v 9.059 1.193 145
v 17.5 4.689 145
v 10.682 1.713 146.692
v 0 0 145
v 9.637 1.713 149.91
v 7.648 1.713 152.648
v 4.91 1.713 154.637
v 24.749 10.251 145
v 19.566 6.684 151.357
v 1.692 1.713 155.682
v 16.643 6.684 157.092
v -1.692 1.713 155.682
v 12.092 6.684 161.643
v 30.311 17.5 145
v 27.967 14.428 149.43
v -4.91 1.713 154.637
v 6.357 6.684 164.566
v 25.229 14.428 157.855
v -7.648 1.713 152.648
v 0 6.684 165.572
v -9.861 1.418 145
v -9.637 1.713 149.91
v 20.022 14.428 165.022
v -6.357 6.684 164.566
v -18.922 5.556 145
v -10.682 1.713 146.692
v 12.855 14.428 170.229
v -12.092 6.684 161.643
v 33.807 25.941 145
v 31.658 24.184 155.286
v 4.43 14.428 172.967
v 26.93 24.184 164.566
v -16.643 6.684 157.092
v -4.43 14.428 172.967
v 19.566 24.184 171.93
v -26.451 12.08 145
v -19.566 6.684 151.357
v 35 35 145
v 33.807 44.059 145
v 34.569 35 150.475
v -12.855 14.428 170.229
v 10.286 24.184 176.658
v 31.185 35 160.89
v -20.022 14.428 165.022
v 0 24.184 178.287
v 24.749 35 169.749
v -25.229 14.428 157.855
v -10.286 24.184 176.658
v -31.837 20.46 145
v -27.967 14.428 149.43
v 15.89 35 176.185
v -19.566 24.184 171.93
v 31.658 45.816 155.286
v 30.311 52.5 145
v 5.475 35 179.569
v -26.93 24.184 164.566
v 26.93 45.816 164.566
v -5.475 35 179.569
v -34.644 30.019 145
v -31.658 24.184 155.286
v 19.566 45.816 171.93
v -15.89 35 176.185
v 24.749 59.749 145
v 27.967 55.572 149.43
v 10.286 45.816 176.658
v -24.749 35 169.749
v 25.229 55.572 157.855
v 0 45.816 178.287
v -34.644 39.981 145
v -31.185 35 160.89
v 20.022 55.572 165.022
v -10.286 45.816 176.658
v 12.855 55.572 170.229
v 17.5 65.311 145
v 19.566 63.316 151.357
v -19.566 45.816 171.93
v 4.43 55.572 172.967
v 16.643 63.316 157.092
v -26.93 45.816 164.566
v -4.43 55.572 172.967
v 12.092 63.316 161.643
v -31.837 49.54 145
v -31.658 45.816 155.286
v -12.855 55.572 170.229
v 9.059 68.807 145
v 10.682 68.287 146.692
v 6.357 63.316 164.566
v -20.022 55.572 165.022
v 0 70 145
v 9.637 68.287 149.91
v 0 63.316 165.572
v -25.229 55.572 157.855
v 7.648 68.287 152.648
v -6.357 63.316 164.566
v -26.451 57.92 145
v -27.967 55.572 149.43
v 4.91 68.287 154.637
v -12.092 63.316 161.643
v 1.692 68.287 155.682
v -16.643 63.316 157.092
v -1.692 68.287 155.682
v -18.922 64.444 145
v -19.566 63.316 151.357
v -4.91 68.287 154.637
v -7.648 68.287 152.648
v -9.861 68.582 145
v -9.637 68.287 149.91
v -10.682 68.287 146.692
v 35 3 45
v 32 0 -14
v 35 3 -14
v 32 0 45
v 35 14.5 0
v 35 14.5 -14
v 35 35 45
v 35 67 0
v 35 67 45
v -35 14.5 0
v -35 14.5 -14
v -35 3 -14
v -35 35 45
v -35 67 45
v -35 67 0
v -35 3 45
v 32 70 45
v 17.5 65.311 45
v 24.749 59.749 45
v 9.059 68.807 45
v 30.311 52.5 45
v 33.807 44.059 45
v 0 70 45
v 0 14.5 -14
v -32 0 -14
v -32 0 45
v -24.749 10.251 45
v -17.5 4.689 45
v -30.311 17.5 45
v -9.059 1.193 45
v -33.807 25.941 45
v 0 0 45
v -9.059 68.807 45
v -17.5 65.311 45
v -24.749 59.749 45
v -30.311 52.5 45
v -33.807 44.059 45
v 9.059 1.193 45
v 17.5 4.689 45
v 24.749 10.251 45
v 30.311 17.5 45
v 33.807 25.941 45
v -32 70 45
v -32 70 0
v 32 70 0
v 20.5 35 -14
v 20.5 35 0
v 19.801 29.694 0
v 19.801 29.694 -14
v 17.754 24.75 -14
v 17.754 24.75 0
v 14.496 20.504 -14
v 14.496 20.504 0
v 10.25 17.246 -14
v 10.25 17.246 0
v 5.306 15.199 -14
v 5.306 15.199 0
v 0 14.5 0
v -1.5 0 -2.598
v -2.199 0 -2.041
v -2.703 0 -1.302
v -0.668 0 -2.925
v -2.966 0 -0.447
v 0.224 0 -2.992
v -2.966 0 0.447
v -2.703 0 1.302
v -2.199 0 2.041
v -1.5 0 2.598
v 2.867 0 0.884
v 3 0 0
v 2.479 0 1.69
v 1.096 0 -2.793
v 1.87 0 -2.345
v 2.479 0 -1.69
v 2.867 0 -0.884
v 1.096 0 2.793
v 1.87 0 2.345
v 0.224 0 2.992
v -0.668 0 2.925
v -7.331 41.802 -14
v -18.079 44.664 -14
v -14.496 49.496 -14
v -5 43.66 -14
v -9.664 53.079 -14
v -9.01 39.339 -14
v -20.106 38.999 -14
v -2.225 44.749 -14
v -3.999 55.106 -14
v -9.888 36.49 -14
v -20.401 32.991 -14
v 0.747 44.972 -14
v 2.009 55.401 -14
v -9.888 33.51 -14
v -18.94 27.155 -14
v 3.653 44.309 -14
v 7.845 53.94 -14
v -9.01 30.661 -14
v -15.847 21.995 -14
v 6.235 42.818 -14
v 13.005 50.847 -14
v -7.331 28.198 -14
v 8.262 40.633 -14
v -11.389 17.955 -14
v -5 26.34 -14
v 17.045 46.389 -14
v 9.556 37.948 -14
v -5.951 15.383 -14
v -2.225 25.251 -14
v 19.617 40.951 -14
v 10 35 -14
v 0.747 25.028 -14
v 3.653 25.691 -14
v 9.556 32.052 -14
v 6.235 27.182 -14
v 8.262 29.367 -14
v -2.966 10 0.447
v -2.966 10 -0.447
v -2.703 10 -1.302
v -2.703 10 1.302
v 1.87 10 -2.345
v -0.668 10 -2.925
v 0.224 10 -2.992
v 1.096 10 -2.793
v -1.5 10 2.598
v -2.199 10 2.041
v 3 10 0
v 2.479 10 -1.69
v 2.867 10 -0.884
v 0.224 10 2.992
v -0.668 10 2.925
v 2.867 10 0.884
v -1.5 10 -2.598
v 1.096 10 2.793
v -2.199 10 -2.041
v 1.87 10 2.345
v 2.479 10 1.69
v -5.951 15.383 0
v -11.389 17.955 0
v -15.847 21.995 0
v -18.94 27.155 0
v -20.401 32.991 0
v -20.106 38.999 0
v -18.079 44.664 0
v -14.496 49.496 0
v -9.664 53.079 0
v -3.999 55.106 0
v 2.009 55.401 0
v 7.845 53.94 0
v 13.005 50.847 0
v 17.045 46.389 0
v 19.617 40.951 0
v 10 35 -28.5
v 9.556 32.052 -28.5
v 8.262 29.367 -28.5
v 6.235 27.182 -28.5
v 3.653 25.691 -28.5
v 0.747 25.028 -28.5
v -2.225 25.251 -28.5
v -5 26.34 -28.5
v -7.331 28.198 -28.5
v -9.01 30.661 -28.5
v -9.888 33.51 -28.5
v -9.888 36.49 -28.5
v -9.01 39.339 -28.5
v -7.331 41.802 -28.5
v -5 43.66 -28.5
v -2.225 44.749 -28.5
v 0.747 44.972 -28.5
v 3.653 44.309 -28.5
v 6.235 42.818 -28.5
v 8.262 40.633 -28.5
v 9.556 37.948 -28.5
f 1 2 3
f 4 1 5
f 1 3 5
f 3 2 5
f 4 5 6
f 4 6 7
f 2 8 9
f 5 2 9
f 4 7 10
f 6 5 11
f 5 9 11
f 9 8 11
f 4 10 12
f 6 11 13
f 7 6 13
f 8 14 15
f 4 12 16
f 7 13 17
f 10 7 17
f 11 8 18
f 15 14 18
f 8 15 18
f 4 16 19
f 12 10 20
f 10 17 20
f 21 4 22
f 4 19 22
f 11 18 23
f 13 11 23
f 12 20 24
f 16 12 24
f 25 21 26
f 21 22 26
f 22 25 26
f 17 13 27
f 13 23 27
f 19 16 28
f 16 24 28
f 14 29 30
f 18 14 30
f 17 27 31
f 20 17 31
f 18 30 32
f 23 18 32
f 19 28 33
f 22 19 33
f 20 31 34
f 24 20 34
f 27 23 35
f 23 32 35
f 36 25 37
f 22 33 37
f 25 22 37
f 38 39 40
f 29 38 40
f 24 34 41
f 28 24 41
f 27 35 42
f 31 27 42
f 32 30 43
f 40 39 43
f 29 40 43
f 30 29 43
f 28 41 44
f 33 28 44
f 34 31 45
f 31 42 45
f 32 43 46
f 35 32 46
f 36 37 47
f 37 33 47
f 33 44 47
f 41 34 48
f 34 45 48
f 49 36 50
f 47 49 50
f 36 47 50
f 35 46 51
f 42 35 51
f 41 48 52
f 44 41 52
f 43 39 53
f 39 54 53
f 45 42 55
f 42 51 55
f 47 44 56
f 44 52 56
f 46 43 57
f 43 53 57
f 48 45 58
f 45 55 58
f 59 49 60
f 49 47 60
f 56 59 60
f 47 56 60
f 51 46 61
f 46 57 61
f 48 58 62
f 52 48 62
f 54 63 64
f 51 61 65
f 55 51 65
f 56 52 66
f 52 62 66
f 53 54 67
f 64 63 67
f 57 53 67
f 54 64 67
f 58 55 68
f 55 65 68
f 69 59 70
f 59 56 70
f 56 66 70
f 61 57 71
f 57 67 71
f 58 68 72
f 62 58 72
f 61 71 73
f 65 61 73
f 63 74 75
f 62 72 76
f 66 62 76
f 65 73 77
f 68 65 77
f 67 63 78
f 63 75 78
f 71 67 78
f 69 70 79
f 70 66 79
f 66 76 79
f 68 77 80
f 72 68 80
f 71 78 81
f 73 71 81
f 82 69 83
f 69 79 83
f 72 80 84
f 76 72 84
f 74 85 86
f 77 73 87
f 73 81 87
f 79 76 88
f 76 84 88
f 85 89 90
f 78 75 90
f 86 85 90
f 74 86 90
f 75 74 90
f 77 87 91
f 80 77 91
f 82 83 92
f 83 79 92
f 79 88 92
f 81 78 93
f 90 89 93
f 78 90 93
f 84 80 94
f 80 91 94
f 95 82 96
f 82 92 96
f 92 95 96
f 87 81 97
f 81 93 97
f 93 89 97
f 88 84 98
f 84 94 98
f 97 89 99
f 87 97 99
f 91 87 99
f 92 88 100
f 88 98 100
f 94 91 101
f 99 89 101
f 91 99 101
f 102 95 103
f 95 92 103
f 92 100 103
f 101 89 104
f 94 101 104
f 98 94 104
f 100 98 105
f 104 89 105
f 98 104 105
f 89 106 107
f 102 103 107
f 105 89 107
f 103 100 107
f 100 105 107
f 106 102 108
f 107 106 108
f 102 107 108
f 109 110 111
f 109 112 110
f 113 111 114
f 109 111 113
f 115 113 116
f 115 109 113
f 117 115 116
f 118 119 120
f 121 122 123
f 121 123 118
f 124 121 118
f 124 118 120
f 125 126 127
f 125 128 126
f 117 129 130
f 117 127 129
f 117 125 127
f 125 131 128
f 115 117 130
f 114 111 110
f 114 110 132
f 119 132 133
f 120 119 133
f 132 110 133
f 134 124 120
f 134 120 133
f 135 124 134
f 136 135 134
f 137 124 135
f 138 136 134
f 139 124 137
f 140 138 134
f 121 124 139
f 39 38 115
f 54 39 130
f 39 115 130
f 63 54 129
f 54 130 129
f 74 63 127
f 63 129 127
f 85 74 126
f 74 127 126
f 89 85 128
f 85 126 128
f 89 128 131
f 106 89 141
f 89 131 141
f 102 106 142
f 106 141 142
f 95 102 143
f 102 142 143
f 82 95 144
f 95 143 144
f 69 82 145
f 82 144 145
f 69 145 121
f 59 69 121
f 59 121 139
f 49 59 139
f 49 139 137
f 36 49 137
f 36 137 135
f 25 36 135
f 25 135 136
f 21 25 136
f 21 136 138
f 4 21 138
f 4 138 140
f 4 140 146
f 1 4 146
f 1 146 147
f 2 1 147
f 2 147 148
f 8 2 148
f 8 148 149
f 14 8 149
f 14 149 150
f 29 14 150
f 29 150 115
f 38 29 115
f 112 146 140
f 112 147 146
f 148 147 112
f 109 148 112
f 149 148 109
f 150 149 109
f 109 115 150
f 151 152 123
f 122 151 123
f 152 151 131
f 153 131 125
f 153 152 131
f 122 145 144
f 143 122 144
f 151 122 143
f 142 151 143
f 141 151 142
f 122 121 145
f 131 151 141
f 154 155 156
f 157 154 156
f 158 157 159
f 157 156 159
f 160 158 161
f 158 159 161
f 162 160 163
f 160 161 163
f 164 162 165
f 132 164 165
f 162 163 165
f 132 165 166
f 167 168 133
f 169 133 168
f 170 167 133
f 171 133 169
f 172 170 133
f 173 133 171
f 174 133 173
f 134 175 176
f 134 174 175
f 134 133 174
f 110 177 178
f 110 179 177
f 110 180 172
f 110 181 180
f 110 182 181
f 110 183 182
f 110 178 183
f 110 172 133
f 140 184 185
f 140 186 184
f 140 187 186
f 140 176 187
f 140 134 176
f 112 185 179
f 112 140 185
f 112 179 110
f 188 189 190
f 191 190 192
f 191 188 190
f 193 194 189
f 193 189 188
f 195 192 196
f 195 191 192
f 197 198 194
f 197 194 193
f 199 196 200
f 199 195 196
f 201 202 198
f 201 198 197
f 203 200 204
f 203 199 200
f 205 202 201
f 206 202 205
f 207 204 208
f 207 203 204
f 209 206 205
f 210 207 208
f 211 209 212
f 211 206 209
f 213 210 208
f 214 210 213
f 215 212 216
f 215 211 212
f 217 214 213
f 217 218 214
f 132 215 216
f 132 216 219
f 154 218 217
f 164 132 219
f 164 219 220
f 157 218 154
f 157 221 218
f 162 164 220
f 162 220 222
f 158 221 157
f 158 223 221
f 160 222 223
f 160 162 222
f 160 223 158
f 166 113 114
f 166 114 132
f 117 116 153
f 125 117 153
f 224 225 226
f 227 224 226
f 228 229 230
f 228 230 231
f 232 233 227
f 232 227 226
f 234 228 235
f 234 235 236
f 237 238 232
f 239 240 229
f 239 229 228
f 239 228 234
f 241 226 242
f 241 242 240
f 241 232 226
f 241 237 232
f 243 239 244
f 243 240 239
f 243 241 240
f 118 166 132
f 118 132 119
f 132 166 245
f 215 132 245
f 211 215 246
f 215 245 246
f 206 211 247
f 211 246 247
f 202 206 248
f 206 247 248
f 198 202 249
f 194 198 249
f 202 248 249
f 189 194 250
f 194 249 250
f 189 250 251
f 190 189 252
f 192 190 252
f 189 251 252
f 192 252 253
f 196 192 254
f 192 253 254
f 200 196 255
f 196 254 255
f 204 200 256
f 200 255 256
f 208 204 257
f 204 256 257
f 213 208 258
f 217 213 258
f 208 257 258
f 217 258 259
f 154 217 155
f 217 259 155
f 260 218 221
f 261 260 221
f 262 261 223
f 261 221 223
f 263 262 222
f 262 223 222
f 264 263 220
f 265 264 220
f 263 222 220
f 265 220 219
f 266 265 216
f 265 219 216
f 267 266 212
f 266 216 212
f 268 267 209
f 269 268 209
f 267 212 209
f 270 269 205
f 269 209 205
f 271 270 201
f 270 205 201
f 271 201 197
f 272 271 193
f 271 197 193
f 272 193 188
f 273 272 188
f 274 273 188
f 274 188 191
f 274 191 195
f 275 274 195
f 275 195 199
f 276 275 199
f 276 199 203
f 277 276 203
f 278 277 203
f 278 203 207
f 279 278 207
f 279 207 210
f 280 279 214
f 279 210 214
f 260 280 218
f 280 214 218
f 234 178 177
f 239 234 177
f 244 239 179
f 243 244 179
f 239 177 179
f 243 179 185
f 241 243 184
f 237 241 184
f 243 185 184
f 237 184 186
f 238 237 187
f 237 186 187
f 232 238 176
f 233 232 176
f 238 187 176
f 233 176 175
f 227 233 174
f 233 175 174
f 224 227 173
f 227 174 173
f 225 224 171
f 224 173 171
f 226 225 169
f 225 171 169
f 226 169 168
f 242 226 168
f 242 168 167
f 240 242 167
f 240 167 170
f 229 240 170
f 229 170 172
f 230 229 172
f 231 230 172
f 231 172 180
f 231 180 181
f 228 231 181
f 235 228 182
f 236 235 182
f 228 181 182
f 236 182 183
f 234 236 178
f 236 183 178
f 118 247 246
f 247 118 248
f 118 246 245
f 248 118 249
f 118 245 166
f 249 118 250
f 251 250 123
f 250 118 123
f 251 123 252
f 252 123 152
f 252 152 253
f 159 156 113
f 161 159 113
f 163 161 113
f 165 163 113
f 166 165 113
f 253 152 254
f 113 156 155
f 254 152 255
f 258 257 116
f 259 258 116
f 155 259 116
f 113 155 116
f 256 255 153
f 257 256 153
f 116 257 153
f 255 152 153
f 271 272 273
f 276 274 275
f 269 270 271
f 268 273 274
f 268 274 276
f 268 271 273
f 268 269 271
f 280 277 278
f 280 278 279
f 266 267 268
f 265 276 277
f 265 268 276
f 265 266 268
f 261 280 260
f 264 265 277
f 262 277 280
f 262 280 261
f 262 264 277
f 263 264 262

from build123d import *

# Parameters (mm, degrees)
SKETCH_W         = 70
SKETCH_H         = 70
PAD_DEPTH        = 45
SKETCH001_R      = 35
PAD001_DEPTH     = 100
POCKET_DEPTH     = 70
REVOLUTION_ANGLE = -180
SKETCH004_R      = 20.5
PAD002_DEPTH     = 14
SKETCH005_R      = 10
PAD003_DEPTH     = 14.5
PAD004_DEPTH     = 14
SKETCH007_R      = 3
POCKET001_DEPTH  = 10


with BuildPart() as part:
    # Sketch → Pad (new body)
    with BuildSketch(Plane.XY):
        with Locations((0, 35)):
            Rectangle(SKETCH_W, SKETCH_H)
    extrude(amount=PAD_DEPTH)

    # Sketch001 → Pad001 (new body)
    with BuildSketch(Plane.XY.offset(45)):
        with Locations((0, 35)):
            Circle(SKETCH001_R)
    extrude(amount=PAD001_DEPTH)

    # Sketch002 → Pocket (cut)
    with BuildSketch(Plane(origin=(0, 0, 0), x_dir=(1, 0, 0), z_dir=(0, 0, -1))):
        Polygon((35, 0), (35, -3), (32, 0), align=None)
        Polygon((35, -70), (35, -67), (32, -70), align=None)
        Polygon((-35, -70), (-32, -70), (-35, -67), align=None)
        Polygon((-35, 0), (-32, 0), (-35, -3), align=None)
    extrude(amount=-POCKET_DEPTH, mode=Mode.SUBTRACT)

    # Sketch003 → Revolution (revolve)
    with BuildSketch(Plane.XY.offset(145)):
        with BuildLine():
            ThreePointArc((0, 0), (35, 35), (0, 70))
            Line((0, 70), (0, 0))
        make_face()
    revolve(axis=Axis((0, 0, 145), (0, 1, 0)), revolution_arc=REVOLUTION_ANGLE)

    # Sketch004 → Pad002 (new body)
    with BuildSketch(Plane(origin=(0, 0, 0), x_dir=(1, 0, 0), z_dir=(0, 0, -1))):
        with Locations((0, -35)):
            Circle(SKETCH004_R)
    extrude(amount=PAD002_DEPTH)

    # Sketch005 → Pad003 (new body)
    with BuildSketch(Plane(origin=(0, 0, -14), x_dir=(1, 0, 0), z_dir=(0, 0, -1))):
        with Locations((0, -35)):
            Circle(SKETCH005_R)
    extrude(amount=PAD003_DEPTH)

    # Sketch006 → Pad004 (new body)
    with BuildSketch(Plane(origin=(0, 0, 0), x_dir=(1, 0, 0), z_dir=(0, 0, -1))):
        Polygon((35, -3), (35, -14.5), (-35, -14.5), (-35, -3), (-32, 0), (32, 0), align=None)
    extrude(amount=PAD004_DEPTH)

    # Sketch007 → Pocket001 (cut)
    with BuildSketch(Plane.XZ):
        Circle(SKETCH007_R)
    extrude(amount=-POCKET001_DEPTH, mode=Mode.SUBTRACT)


solid = part.part
